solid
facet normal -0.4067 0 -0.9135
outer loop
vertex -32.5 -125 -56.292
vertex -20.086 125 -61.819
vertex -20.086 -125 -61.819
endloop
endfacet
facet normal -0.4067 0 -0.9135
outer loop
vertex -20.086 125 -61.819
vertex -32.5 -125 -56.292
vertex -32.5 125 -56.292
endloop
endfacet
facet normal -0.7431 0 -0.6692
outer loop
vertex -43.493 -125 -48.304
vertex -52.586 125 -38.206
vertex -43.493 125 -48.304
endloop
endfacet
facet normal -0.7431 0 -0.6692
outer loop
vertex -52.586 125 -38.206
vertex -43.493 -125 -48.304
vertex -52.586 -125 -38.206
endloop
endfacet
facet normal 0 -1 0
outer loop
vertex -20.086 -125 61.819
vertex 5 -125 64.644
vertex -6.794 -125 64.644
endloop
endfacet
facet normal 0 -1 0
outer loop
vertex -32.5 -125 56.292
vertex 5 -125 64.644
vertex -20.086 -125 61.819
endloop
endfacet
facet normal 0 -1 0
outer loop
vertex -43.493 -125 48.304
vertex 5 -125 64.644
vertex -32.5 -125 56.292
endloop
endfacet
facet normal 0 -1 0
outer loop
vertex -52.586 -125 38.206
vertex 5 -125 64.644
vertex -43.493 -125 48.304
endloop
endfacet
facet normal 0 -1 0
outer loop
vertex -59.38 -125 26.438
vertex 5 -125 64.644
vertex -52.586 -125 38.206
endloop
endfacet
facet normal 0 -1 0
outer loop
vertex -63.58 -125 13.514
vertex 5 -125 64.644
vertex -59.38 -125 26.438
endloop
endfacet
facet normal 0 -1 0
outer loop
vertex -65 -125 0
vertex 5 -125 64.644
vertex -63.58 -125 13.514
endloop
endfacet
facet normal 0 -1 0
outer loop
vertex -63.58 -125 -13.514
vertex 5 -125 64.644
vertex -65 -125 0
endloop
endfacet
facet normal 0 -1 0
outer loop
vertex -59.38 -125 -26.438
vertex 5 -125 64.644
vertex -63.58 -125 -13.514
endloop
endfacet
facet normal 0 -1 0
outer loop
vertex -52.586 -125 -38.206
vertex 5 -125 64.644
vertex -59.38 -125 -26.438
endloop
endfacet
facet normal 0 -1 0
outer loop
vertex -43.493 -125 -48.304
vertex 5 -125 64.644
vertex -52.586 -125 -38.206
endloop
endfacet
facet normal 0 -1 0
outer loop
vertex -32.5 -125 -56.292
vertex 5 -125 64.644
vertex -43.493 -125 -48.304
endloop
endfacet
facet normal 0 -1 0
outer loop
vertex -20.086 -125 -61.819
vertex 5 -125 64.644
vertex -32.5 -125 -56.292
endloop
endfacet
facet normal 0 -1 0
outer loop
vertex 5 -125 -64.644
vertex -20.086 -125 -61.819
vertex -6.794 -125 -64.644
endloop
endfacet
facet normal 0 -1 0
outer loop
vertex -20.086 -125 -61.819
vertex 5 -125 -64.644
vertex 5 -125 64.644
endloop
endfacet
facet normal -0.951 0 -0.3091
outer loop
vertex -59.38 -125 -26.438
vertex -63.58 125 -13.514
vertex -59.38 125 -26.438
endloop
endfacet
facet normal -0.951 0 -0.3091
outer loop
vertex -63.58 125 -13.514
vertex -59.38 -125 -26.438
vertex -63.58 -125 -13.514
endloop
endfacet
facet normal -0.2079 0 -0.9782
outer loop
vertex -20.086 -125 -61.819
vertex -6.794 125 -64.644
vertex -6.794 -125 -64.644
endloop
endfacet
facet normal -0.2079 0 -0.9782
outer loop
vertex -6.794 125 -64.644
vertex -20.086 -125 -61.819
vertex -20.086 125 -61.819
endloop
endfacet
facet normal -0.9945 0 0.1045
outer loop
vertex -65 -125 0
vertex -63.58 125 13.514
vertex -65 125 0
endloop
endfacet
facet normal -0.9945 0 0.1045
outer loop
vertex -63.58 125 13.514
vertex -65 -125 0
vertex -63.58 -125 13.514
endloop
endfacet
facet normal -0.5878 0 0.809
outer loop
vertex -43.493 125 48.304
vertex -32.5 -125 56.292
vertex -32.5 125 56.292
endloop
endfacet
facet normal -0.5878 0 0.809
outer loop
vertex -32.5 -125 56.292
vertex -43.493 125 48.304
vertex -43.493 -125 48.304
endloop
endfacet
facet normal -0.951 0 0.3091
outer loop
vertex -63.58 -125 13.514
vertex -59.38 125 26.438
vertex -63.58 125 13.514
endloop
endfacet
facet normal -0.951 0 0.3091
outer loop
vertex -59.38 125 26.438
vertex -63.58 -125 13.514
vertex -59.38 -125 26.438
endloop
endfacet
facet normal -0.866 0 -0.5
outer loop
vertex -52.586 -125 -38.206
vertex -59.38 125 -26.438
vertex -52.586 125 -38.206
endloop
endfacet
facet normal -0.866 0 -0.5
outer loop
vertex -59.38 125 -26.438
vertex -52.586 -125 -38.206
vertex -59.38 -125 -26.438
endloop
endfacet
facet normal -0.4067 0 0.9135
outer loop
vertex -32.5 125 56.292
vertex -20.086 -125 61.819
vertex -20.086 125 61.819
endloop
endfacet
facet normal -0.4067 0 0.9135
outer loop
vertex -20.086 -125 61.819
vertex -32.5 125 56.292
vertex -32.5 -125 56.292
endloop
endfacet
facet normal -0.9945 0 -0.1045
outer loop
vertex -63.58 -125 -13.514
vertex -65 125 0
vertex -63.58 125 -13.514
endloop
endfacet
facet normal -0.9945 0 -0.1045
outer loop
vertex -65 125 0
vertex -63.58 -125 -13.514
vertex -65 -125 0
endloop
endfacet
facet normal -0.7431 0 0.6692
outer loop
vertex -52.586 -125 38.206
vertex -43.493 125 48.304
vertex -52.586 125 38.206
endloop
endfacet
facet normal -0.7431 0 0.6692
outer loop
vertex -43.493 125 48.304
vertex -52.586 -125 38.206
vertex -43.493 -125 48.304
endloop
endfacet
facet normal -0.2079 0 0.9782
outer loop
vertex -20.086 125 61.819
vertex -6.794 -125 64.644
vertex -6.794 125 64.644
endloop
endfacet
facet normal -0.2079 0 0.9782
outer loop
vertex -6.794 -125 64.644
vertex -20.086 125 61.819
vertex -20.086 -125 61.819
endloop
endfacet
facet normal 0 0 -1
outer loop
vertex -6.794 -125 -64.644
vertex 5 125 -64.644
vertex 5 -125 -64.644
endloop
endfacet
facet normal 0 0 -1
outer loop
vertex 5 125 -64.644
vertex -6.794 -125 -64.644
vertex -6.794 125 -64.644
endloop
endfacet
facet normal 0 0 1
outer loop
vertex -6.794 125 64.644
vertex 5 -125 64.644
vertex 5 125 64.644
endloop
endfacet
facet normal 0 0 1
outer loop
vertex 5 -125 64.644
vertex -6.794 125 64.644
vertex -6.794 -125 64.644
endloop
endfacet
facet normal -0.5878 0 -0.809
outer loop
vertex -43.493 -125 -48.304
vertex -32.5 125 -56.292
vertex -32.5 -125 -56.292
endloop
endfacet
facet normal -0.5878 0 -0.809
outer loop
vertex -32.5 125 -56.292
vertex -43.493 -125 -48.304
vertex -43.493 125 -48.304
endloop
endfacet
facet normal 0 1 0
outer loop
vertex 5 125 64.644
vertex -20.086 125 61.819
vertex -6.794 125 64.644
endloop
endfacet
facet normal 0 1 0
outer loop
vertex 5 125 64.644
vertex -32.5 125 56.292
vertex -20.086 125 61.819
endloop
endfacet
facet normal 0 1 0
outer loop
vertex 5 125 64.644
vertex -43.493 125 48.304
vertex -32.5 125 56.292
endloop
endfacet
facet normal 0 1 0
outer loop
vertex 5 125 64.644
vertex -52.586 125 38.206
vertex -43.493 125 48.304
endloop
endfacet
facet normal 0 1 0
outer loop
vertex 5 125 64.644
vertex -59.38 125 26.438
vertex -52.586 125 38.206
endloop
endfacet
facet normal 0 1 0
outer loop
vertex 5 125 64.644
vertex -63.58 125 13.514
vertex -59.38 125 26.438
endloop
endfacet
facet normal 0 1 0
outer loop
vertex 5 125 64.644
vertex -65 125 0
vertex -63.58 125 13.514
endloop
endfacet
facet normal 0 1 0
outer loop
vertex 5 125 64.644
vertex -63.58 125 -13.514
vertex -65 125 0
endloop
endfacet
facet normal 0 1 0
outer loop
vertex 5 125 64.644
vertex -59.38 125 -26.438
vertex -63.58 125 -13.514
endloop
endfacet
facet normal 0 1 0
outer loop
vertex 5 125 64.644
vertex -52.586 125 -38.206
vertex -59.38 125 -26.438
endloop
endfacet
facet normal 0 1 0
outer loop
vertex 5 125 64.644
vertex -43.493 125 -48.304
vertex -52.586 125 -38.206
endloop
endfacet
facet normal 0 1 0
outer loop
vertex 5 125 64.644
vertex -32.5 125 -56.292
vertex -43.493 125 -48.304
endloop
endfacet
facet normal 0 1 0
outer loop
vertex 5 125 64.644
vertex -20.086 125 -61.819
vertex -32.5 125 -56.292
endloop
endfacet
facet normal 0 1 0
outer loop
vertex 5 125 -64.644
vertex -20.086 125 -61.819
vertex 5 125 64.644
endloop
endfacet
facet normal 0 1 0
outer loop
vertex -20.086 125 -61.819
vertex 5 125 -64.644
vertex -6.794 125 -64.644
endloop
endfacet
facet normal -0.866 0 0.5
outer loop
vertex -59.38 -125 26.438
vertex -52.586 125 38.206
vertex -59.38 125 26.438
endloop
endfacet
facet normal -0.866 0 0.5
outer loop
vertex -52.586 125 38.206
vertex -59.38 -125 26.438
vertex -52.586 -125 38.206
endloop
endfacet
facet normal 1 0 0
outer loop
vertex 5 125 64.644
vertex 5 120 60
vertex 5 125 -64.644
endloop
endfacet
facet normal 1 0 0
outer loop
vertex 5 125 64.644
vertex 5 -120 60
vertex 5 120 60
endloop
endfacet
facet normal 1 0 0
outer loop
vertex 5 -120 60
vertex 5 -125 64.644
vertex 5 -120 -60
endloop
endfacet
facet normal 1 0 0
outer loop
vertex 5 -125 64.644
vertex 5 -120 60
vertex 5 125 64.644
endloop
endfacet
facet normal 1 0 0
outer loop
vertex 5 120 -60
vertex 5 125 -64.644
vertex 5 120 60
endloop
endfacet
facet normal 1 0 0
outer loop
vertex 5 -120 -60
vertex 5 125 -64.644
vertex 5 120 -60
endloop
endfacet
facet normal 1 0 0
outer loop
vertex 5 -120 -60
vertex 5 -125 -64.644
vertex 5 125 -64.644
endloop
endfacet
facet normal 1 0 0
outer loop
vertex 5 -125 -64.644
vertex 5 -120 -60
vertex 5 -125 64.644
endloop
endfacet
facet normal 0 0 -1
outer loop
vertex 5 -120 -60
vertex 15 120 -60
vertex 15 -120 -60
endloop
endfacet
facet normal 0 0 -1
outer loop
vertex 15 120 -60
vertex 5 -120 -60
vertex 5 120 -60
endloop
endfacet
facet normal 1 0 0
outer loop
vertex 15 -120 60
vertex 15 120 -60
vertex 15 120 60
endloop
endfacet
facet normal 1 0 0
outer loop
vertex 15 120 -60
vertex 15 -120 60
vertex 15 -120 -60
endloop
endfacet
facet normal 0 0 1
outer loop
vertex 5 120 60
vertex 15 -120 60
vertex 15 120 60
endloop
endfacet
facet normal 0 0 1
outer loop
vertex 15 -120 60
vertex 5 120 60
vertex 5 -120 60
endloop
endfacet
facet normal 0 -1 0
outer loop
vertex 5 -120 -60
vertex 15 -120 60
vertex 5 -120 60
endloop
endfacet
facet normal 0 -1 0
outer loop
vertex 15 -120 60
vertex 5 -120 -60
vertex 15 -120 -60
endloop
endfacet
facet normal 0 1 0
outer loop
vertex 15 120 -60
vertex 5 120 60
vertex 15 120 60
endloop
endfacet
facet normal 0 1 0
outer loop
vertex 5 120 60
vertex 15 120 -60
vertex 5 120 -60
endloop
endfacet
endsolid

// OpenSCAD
trainLength = 250;
trainWidth = 120;
trainHeight = 120;
wallThickness = 10;
buttomThickness = wallThickness*2;
adjust = wallThickness / 2;

// change density on printer, as we do not care if roof if solid

 difference() {
  rotate([90,0,0])cylinder(r=65, h=250, center=true);
  translate([35,0,0]) cube(size=[60,500,130], center=true);
}

translate([10,0,0]) rotate([0,90,0])cube(size=[trainWidth, trainLength-wallThickness, 10], center=true);
